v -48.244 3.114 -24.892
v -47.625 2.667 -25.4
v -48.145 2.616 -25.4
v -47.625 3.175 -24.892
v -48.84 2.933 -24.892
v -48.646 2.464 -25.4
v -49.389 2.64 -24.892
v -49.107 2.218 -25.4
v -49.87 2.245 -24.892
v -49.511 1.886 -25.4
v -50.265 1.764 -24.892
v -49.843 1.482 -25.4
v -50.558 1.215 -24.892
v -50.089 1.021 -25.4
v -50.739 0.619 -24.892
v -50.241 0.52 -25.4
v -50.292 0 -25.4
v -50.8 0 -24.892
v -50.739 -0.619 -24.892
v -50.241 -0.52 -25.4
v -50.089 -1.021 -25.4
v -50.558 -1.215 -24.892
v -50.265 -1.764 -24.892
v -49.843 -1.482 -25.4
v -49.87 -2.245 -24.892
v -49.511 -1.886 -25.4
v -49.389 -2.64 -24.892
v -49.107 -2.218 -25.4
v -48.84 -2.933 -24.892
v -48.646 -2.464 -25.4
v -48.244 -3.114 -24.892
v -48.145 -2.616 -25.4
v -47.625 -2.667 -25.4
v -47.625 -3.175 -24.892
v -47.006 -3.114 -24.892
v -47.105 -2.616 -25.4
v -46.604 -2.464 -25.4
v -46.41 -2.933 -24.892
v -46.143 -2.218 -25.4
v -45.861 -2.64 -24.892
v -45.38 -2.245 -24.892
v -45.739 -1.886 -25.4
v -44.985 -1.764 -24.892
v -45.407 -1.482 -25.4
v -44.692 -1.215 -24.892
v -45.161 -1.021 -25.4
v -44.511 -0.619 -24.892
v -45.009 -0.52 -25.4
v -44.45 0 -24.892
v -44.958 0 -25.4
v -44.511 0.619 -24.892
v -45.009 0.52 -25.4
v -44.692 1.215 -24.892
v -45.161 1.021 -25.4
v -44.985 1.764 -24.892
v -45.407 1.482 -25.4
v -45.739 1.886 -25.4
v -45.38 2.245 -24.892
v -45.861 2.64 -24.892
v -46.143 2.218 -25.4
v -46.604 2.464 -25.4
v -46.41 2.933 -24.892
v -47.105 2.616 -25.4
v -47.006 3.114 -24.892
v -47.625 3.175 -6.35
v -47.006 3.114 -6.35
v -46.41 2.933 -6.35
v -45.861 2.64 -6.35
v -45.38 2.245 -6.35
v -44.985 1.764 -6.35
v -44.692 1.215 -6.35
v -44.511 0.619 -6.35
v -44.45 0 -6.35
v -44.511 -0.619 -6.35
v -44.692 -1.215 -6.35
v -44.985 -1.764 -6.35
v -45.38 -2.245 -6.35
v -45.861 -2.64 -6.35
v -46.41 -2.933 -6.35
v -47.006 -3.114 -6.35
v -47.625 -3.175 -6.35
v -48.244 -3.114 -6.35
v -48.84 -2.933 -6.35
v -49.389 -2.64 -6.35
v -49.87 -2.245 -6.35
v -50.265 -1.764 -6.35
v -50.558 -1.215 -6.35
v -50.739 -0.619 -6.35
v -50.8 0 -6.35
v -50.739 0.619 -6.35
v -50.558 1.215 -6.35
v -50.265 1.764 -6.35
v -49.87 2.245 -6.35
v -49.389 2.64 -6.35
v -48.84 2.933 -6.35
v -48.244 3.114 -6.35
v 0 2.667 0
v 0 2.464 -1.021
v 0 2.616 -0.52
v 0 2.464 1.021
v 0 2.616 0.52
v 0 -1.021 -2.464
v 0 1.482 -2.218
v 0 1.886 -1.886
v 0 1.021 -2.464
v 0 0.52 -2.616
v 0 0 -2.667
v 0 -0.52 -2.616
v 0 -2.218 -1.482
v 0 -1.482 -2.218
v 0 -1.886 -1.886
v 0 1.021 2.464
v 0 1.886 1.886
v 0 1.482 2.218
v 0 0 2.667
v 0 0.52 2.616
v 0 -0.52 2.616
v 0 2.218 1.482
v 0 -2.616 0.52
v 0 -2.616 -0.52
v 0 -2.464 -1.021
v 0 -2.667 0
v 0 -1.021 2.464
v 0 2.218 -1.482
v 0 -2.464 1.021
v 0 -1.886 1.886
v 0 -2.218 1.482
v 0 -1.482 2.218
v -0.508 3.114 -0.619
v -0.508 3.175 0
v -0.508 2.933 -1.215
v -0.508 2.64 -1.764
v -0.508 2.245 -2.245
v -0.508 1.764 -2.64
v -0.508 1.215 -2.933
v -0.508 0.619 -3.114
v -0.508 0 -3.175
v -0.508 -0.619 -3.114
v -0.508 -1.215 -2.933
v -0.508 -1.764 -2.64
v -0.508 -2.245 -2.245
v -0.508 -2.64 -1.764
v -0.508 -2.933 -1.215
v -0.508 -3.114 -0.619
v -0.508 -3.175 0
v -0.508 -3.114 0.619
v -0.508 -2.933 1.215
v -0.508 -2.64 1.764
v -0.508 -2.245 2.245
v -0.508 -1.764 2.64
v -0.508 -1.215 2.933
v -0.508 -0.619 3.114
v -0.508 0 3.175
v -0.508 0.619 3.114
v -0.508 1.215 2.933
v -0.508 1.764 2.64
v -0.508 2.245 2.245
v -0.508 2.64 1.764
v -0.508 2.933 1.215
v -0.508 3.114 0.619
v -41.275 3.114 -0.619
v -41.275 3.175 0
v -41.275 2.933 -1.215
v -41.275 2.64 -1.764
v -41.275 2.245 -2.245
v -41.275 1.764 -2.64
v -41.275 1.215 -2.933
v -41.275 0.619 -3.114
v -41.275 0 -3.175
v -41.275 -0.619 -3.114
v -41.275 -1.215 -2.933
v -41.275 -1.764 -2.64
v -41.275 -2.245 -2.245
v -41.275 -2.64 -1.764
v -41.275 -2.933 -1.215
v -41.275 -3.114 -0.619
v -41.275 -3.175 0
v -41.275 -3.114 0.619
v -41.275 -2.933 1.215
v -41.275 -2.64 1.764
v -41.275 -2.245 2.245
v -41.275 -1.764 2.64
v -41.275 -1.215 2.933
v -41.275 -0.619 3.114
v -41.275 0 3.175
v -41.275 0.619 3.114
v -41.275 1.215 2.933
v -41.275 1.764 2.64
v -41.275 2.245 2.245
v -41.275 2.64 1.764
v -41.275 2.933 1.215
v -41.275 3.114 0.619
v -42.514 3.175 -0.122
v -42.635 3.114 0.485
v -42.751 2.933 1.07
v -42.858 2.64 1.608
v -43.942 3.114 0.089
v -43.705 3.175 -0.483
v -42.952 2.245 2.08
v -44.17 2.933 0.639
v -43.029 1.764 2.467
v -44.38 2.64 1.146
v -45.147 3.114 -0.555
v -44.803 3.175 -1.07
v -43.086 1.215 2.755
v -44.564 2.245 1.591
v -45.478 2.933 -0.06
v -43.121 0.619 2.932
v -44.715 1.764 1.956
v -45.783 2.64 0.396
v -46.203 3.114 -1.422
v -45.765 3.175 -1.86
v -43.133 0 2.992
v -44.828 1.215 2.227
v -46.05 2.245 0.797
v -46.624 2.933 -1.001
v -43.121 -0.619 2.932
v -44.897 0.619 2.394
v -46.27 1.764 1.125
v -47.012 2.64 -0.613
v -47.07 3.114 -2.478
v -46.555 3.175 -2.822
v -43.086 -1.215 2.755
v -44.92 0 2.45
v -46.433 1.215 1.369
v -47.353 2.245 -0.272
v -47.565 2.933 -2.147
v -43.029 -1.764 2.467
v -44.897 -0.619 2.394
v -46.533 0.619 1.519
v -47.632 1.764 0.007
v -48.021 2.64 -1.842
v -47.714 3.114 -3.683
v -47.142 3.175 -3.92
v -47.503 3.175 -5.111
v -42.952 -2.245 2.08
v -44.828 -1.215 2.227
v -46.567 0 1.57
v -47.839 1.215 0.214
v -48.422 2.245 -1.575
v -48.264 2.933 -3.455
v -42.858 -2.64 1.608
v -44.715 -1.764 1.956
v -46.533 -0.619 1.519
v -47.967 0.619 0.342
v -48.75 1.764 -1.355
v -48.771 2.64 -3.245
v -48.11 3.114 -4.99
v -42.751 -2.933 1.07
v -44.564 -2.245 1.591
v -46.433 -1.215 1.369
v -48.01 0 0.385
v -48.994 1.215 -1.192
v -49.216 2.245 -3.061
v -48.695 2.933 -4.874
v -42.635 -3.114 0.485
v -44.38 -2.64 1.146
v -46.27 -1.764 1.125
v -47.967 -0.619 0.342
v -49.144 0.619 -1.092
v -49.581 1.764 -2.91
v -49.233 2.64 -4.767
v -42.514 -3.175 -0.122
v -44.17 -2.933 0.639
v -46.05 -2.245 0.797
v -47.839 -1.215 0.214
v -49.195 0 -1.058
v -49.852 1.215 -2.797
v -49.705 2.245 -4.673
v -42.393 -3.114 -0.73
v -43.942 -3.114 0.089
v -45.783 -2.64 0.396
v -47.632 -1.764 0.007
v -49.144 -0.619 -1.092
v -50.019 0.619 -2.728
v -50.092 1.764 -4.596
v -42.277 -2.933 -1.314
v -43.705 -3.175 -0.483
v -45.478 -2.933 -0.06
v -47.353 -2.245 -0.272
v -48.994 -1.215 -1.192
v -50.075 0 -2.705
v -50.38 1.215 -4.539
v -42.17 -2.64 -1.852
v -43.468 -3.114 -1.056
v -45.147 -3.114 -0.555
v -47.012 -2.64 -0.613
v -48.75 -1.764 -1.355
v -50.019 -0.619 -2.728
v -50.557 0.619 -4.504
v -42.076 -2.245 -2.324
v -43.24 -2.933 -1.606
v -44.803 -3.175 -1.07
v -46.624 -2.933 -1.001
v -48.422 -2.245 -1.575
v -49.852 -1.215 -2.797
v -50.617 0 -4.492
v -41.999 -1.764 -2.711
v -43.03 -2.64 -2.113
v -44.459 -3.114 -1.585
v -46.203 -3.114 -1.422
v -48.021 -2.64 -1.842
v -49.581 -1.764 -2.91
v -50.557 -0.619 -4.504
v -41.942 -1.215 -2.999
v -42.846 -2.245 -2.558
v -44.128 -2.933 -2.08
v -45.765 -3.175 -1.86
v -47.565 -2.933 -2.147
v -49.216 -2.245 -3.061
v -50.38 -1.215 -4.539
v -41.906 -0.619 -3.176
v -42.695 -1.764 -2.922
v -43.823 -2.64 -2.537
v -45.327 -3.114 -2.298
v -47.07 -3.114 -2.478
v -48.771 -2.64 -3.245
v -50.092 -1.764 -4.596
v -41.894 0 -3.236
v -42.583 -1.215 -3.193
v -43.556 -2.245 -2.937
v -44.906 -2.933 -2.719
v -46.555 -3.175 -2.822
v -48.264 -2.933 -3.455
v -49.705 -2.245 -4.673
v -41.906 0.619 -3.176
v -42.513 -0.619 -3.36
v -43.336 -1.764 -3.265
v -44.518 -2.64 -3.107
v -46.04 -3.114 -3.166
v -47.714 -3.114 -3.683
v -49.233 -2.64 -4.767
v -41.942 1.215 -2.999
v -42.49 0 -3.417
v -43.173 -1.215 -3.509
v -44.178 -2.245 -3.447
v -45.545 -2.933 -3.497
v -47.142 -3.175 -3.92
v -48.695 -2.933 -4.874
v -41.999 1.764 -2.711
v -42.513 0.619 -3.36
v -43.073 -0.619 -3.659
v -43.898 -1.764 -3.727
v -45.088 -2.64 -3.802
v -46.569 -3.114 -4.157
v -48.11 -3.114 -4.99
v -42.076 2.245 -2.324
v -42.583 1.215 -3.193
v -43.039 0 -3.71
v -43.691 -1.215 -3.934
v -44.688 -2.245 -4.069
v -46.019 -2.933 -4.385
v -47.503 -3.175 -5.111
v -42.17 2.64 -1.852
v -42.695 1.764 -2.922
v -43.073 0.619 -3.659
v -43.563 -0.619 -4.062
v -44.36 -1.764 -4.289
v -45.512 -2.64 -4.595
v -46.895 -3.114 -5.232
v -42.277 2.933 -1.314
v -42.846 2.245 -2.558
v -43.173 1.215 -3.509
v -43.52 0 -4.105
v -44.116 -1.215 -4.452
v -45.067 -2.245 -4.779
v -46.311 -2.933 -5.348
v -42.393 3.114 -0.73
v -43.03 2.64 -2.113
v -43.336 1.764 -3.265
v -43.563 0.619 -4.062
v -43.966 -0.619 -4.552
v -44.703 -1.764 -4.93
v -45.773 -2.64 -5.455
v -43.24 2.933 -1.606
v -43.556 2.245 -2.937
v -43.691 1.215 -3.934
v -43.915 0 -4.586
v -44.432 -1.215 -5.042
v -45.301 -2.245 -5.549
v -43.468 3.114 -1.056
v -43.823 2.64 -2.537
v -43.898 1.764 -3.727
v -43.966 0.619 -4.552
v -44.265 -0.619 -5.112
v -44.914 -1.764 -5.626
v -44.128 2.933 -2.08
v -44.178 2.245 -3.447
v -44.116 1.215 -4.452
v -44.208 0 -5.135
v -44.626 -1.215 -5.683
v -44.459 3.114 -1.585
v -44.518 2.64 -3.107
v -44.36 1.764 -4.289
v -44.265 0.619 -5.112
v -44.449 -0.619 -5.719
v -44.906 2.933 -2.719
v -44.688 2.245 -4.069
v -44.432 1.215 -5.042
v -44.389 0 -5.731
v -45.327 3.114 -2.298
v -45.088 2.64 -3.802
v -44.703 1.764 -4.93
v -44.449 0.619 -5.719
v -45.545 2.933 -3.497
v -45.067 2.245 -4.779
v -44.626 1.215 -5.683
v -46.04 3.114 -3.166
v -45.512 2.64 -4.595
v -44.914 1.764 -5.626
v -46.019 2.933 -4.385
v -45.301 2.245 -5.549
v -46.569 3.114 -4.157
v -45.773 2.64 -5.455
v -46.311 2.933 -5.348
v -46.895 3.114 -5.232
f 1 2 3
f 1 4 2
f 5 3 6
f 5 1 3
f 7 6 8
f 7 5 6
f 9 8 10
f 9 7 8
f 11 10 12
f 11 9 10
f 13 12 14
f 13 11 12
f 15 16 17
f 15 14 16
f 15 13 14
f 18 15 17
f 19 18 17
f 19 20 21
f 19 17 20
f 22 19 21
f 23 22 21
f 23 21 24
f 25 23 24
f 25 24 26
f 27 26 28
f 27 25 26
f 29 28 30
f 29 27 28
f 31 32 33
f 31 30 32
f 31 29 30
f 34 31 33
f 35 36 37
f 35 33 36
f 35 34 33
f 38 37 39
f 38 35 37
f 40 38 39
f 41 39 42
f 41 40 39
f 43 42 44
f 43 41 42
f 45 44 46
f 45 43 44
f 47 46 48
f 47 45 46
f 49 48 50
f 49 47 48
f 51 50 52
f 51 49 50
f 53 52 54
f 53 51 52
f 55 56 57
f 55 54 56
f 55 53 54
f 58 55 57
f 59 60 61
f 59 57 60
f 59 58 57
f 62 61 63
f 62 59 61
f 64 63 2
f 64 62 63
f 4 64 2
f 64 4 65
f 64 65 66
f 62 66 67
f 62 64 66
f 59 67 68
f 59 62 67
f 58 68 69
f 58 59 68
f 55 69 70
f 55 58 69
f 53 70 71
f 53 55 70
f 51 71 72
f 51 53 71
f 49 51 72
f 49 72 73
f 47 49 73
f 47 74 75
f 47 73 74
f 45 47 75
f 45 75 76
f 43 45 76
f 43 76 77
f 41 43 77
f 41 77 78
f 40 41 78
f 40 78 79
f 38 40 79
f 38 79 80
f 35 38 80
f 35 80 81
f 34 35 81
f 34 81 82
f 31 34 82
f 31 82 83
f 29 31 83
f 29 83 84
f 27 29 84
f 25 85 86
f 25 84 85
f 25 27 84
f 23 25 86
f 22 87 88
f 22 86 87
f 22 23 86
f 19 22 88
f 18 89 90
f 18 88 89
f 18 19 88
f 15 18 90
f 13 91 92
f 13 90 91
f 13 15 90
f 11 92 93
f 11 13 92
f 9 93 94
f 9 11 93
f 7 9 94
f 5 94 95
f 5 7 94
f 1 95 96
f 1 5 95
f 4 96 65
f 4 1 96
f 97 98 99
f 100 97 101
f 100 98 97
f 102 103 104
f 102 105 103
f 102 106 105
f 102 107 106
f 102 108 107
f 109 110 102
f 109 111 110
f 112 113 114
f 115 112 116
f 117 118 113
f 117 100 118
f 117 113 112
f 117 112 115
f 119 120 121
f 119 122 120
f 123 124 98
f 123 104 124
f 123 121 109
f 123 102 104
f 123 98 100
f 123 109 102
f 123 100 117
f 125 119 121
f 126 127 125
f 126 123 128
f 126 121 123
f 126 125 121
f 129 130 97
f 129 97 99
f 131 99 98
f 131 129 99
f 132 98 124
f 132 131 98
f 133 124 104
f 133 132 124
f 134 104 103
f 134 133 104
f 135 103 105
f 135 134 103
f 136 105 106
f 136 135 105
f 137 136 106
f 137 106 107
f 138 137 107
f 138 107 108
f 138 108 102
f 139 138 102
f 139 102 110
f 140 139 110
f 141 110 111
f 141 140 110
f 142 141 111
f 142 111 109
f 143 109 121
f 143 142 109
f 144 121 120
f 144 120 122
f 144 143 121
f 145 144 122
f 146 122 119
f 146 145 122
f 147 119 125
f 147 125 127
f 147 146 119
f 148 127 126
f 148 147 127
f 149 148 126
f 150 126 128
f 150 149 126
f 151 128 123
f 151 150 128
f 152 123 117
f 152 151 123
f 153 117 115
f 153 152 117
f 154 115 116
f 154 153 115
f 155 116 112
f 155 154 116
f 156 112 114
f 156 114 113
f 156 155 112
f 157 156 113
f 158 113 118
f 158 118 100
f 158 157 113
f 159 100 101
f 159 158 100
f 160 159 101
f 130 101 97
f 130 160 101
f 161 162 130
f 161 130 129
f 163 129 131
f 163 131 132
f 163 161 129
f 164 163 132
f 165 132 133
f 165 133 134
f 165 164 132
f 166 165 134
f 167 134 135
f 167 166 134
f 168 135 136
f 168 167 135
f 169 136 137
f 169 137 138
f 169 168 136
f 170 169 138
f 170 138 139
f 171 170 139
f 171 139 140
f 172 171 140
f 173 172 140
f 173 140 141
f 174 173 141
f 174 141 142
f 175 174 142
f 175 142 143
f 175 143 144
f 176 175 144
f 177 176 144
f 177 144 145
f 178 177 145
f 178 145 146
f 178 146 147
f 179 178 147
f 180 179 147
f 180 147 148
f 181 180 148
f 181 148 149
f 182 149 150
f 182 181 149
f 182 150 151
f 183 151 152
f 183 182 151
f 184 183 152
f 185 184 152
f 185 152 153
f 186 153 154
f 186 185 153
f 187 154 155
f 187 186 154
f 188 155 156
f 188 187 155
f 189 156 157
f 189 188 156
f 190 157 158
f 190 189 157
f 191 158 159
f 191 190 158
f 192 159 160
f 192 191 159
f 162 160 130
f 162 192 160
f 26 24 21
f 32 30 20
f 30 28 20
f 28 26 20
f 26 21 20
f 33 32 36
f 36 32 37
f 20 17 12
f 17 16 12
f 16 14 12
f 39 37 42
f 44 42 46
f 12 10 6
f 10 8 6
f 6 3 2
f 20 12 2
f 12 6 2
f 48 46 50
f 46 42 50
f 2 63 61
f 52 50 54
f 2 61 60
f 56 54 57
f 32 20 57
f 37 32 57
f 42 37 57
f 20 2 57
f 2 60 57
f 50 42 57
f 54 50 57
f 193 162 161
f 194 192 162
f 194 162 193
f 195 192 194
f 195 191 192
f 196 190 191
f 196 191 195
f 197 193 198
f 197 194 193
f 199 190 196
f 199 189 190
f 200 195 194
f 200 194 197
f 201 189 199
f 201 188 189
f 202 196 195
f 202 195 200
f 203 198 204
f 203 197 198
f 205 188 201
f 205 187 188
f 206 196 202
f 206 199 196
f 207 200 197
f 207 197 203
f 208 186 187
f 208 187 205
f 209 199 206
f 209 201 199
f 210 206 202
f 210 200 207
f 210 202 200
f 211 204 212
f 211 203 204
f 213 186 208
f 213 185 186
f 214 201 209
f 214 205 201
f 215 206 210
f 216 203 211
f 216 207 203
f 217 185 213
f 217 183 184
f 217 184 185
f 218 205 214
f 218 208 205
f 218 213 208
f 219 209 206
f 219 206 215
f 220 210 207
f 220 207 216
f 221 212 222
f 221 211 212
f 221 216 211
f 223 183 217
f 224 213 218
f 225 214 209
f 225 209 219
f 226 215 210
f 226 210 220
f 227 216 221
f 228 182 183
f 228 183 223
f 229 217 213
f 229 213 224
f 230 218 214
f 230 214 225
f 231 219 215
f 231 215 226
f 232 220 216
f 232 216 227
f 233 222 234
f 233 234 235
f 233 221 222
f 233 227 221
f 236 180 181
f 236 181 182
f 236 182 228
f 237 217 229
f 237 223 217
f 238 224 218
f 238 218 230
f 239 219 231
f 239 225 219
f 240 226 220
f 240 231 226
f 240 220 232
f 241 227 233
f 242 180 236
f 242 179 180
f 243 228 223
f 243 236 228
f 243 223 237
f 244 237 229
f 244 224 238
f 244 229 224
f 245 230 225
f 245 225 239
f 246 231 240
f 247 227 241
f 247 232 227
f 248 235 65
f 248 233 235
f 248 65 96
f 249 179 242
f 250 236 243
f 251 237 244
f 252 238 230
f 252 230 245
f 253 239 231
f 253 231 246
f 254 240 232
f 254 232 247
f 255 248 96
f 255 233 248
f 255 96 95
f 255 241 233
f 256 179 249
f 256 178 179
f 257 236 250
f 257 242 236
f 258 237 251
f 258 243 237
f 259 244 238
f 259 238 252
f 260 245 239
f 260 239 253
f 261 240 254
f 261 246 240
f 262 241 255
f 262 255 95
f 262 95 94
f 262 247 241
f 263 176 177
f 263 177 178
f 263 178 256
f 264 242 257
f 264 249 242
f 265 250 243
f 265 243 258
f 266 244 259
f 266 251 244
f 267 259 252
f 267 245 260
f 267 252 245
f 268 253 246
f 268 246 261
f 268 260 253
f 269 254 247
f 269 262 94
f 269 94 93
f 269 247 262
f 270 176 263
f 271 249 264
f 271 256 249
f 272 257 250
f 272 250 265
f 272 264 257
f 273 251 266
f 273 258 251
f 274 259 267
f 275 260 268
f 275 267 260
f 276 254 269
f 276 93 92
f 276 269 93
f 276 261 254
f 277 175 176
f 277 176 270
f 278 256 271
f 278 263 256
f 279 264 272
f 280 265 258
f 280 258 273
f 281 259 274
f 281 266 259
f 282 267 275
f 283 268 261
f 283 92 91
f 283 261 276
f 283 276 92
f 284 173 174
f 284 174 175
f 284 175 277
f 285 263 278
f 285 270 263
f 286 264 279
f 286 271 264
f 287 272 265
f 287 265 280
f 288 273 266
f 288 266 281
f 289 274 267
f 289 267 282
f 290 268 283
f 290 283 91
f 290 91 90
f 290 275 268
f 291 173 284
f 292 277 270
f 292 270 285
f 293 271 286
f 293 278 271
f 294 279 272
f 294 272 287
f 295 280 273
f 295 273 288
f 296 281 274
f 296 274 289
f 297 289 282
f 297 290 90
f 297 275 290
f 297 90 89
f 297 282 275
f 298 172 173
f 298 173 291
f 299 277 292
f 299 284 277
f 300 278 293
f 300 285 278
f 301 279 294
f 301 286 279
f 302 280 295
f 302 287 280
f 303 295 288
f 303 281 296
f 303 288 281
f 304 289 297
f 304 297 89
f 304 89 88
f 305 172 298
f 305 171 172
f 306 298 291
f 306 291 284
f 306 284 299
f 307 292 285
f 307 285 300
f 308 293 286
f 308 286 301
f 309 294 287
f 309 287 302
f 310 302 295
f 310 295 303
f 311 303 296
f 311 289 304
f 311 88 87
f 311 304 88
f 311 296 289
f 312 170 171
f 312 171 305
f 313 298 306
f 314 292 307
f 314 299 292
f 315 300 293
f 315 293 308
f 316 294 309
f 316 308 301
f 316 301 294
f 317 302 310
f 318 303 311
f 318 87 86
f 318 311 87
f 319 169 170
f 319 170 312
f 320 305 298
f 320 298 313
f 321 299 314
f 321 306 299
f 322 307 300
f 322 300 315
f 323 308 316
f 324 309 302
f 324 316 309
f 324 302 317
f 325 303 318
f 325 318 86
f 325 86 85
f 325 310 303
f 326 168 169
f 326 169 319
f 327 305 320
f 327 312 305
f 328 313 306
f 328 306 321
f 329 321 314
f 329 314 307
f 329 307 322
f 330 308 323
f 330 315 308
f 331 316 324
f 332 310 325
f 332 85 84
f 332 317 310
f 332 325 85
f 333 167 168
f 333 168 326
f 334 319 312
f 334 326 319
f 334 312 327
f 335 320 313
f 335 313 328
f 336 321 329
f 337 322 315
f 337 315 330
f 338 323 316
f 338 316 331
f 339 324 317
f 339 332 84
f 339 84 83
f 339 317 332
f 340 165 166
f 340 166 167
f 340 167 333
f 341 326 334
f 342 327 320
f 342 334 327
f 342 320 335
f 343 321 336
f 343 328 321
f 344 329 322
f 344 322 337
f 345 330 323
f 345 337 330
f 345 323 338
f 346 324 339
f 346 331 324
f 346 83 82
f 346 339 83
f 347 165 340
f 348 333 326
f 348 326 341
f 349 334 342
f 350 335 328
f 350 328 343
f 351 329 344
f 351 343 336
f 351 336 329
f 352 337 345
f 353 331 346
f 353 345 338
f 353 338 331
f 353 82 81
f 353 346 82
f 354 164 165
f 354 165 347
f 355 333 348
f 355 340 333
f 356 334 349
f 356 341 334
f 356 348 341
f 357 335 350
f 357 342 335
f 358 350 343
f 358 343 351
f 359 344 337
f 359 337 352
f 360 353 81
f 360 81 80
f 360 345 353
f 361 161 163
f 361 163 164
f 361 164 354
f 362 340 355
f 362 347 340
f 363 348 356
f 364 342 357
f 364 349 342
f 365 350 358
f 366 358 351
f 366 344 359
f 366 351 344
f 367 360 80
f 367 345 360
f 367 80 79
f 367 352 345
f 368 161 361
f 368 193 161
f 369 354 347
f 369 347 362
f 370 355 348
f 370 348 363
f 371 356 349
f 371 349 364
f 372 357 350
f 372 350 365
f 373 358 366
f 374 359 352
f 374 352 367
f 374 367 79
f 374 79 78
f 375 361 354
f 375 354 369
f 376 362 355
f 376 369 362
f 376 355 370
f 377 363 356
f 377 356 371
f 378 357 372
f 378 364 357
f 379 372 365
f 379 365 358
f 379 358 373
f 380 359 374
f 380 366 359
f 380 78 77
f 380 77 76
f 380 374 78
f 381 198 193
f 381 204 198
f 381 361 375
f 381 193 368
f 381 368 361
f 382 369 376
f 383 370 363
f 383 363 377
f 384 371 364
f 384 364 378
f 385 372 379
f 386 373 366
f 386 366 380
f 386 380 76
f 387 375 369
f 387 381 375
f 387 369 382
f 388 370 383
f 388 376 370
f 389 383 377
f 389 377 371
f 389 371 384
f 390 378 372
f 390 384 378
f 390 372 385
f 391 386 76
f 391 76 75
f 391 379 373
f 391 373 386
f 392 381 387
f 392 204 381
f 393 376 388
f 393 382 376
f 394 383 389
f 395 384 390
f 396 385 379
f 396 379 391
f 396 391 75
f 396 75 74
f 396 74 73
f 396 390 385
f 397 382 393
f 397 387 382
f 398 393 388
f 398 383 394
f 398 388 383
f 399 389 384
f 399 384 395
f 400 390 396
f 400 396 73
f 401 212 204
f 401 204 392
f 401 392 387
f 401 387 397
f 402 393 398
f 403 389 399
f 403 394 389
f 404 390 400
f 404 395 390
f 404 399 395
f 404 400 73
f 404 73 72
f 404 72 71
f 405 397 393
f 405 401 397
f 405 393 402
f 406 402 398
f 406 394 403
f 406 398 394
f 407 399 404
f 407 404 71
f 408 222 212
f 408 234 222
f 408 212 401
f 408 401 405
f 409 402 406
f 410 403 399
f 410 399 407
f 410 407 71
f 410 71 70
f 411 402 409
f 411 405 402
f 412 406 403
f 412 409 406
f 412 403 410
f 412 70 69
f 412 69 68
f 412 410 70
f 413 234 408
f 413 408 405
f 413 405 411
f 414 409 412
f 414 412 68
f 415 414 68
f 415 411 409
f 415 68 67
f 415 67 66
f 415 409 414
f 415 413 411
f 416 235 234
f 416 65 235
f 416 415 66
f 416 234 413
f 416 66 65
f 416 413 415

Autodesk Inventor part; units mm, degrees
ref_plane "YZ Plane" through (0, 0, 0) normal (1, 0, 0) x (0, 1, 0)
ref_plane "XZ Plane" through (0, 0, 0) normal (0, 1, 0) x (-1, 0, 0)
ref_plane "XY Plane" through (0, 0, 0) normal (0, 0, 1) x (1, 0, 0)
sketch "Sketch1" plane through (0, 0, 0) normal (0, 1, 0) x (-1, 0, 0)
  line L0 (0, 0) -> (41.275, 0)
  line L1 (47.625, -6.35) -> (47.625, -25.4)
  arc A0 (47.625, -6.35) -> (41.275, 0) centre (41.275, -6.35) ccw
  point P0 (47.625, 0)
  dimension "d0" = 47.625
  dimension "d1" = 25.4
  dimension "d3" = 6.35
sketch "Sketch2" plane through (0, 0, 0) normal (1, 0, 0) x (0, 1, 0)
  circle A0 centre (0, 0) radius 3.175
  dimension "d2" = 6.35
sweep "Sweep1" add profiles "Sketch2" path "Sketch1"
chamfer "Chamfer1" distance 0.508 angle 45 1 edges at (0, -3.175, 0)
thread "Thread1"
chamfer "Chamfer2" distance 0.508 angle 45 1 edges at (-47.625, -3.175, -25.4)
properties part number "fc17-015_AnchorBolt" material "Steel"
